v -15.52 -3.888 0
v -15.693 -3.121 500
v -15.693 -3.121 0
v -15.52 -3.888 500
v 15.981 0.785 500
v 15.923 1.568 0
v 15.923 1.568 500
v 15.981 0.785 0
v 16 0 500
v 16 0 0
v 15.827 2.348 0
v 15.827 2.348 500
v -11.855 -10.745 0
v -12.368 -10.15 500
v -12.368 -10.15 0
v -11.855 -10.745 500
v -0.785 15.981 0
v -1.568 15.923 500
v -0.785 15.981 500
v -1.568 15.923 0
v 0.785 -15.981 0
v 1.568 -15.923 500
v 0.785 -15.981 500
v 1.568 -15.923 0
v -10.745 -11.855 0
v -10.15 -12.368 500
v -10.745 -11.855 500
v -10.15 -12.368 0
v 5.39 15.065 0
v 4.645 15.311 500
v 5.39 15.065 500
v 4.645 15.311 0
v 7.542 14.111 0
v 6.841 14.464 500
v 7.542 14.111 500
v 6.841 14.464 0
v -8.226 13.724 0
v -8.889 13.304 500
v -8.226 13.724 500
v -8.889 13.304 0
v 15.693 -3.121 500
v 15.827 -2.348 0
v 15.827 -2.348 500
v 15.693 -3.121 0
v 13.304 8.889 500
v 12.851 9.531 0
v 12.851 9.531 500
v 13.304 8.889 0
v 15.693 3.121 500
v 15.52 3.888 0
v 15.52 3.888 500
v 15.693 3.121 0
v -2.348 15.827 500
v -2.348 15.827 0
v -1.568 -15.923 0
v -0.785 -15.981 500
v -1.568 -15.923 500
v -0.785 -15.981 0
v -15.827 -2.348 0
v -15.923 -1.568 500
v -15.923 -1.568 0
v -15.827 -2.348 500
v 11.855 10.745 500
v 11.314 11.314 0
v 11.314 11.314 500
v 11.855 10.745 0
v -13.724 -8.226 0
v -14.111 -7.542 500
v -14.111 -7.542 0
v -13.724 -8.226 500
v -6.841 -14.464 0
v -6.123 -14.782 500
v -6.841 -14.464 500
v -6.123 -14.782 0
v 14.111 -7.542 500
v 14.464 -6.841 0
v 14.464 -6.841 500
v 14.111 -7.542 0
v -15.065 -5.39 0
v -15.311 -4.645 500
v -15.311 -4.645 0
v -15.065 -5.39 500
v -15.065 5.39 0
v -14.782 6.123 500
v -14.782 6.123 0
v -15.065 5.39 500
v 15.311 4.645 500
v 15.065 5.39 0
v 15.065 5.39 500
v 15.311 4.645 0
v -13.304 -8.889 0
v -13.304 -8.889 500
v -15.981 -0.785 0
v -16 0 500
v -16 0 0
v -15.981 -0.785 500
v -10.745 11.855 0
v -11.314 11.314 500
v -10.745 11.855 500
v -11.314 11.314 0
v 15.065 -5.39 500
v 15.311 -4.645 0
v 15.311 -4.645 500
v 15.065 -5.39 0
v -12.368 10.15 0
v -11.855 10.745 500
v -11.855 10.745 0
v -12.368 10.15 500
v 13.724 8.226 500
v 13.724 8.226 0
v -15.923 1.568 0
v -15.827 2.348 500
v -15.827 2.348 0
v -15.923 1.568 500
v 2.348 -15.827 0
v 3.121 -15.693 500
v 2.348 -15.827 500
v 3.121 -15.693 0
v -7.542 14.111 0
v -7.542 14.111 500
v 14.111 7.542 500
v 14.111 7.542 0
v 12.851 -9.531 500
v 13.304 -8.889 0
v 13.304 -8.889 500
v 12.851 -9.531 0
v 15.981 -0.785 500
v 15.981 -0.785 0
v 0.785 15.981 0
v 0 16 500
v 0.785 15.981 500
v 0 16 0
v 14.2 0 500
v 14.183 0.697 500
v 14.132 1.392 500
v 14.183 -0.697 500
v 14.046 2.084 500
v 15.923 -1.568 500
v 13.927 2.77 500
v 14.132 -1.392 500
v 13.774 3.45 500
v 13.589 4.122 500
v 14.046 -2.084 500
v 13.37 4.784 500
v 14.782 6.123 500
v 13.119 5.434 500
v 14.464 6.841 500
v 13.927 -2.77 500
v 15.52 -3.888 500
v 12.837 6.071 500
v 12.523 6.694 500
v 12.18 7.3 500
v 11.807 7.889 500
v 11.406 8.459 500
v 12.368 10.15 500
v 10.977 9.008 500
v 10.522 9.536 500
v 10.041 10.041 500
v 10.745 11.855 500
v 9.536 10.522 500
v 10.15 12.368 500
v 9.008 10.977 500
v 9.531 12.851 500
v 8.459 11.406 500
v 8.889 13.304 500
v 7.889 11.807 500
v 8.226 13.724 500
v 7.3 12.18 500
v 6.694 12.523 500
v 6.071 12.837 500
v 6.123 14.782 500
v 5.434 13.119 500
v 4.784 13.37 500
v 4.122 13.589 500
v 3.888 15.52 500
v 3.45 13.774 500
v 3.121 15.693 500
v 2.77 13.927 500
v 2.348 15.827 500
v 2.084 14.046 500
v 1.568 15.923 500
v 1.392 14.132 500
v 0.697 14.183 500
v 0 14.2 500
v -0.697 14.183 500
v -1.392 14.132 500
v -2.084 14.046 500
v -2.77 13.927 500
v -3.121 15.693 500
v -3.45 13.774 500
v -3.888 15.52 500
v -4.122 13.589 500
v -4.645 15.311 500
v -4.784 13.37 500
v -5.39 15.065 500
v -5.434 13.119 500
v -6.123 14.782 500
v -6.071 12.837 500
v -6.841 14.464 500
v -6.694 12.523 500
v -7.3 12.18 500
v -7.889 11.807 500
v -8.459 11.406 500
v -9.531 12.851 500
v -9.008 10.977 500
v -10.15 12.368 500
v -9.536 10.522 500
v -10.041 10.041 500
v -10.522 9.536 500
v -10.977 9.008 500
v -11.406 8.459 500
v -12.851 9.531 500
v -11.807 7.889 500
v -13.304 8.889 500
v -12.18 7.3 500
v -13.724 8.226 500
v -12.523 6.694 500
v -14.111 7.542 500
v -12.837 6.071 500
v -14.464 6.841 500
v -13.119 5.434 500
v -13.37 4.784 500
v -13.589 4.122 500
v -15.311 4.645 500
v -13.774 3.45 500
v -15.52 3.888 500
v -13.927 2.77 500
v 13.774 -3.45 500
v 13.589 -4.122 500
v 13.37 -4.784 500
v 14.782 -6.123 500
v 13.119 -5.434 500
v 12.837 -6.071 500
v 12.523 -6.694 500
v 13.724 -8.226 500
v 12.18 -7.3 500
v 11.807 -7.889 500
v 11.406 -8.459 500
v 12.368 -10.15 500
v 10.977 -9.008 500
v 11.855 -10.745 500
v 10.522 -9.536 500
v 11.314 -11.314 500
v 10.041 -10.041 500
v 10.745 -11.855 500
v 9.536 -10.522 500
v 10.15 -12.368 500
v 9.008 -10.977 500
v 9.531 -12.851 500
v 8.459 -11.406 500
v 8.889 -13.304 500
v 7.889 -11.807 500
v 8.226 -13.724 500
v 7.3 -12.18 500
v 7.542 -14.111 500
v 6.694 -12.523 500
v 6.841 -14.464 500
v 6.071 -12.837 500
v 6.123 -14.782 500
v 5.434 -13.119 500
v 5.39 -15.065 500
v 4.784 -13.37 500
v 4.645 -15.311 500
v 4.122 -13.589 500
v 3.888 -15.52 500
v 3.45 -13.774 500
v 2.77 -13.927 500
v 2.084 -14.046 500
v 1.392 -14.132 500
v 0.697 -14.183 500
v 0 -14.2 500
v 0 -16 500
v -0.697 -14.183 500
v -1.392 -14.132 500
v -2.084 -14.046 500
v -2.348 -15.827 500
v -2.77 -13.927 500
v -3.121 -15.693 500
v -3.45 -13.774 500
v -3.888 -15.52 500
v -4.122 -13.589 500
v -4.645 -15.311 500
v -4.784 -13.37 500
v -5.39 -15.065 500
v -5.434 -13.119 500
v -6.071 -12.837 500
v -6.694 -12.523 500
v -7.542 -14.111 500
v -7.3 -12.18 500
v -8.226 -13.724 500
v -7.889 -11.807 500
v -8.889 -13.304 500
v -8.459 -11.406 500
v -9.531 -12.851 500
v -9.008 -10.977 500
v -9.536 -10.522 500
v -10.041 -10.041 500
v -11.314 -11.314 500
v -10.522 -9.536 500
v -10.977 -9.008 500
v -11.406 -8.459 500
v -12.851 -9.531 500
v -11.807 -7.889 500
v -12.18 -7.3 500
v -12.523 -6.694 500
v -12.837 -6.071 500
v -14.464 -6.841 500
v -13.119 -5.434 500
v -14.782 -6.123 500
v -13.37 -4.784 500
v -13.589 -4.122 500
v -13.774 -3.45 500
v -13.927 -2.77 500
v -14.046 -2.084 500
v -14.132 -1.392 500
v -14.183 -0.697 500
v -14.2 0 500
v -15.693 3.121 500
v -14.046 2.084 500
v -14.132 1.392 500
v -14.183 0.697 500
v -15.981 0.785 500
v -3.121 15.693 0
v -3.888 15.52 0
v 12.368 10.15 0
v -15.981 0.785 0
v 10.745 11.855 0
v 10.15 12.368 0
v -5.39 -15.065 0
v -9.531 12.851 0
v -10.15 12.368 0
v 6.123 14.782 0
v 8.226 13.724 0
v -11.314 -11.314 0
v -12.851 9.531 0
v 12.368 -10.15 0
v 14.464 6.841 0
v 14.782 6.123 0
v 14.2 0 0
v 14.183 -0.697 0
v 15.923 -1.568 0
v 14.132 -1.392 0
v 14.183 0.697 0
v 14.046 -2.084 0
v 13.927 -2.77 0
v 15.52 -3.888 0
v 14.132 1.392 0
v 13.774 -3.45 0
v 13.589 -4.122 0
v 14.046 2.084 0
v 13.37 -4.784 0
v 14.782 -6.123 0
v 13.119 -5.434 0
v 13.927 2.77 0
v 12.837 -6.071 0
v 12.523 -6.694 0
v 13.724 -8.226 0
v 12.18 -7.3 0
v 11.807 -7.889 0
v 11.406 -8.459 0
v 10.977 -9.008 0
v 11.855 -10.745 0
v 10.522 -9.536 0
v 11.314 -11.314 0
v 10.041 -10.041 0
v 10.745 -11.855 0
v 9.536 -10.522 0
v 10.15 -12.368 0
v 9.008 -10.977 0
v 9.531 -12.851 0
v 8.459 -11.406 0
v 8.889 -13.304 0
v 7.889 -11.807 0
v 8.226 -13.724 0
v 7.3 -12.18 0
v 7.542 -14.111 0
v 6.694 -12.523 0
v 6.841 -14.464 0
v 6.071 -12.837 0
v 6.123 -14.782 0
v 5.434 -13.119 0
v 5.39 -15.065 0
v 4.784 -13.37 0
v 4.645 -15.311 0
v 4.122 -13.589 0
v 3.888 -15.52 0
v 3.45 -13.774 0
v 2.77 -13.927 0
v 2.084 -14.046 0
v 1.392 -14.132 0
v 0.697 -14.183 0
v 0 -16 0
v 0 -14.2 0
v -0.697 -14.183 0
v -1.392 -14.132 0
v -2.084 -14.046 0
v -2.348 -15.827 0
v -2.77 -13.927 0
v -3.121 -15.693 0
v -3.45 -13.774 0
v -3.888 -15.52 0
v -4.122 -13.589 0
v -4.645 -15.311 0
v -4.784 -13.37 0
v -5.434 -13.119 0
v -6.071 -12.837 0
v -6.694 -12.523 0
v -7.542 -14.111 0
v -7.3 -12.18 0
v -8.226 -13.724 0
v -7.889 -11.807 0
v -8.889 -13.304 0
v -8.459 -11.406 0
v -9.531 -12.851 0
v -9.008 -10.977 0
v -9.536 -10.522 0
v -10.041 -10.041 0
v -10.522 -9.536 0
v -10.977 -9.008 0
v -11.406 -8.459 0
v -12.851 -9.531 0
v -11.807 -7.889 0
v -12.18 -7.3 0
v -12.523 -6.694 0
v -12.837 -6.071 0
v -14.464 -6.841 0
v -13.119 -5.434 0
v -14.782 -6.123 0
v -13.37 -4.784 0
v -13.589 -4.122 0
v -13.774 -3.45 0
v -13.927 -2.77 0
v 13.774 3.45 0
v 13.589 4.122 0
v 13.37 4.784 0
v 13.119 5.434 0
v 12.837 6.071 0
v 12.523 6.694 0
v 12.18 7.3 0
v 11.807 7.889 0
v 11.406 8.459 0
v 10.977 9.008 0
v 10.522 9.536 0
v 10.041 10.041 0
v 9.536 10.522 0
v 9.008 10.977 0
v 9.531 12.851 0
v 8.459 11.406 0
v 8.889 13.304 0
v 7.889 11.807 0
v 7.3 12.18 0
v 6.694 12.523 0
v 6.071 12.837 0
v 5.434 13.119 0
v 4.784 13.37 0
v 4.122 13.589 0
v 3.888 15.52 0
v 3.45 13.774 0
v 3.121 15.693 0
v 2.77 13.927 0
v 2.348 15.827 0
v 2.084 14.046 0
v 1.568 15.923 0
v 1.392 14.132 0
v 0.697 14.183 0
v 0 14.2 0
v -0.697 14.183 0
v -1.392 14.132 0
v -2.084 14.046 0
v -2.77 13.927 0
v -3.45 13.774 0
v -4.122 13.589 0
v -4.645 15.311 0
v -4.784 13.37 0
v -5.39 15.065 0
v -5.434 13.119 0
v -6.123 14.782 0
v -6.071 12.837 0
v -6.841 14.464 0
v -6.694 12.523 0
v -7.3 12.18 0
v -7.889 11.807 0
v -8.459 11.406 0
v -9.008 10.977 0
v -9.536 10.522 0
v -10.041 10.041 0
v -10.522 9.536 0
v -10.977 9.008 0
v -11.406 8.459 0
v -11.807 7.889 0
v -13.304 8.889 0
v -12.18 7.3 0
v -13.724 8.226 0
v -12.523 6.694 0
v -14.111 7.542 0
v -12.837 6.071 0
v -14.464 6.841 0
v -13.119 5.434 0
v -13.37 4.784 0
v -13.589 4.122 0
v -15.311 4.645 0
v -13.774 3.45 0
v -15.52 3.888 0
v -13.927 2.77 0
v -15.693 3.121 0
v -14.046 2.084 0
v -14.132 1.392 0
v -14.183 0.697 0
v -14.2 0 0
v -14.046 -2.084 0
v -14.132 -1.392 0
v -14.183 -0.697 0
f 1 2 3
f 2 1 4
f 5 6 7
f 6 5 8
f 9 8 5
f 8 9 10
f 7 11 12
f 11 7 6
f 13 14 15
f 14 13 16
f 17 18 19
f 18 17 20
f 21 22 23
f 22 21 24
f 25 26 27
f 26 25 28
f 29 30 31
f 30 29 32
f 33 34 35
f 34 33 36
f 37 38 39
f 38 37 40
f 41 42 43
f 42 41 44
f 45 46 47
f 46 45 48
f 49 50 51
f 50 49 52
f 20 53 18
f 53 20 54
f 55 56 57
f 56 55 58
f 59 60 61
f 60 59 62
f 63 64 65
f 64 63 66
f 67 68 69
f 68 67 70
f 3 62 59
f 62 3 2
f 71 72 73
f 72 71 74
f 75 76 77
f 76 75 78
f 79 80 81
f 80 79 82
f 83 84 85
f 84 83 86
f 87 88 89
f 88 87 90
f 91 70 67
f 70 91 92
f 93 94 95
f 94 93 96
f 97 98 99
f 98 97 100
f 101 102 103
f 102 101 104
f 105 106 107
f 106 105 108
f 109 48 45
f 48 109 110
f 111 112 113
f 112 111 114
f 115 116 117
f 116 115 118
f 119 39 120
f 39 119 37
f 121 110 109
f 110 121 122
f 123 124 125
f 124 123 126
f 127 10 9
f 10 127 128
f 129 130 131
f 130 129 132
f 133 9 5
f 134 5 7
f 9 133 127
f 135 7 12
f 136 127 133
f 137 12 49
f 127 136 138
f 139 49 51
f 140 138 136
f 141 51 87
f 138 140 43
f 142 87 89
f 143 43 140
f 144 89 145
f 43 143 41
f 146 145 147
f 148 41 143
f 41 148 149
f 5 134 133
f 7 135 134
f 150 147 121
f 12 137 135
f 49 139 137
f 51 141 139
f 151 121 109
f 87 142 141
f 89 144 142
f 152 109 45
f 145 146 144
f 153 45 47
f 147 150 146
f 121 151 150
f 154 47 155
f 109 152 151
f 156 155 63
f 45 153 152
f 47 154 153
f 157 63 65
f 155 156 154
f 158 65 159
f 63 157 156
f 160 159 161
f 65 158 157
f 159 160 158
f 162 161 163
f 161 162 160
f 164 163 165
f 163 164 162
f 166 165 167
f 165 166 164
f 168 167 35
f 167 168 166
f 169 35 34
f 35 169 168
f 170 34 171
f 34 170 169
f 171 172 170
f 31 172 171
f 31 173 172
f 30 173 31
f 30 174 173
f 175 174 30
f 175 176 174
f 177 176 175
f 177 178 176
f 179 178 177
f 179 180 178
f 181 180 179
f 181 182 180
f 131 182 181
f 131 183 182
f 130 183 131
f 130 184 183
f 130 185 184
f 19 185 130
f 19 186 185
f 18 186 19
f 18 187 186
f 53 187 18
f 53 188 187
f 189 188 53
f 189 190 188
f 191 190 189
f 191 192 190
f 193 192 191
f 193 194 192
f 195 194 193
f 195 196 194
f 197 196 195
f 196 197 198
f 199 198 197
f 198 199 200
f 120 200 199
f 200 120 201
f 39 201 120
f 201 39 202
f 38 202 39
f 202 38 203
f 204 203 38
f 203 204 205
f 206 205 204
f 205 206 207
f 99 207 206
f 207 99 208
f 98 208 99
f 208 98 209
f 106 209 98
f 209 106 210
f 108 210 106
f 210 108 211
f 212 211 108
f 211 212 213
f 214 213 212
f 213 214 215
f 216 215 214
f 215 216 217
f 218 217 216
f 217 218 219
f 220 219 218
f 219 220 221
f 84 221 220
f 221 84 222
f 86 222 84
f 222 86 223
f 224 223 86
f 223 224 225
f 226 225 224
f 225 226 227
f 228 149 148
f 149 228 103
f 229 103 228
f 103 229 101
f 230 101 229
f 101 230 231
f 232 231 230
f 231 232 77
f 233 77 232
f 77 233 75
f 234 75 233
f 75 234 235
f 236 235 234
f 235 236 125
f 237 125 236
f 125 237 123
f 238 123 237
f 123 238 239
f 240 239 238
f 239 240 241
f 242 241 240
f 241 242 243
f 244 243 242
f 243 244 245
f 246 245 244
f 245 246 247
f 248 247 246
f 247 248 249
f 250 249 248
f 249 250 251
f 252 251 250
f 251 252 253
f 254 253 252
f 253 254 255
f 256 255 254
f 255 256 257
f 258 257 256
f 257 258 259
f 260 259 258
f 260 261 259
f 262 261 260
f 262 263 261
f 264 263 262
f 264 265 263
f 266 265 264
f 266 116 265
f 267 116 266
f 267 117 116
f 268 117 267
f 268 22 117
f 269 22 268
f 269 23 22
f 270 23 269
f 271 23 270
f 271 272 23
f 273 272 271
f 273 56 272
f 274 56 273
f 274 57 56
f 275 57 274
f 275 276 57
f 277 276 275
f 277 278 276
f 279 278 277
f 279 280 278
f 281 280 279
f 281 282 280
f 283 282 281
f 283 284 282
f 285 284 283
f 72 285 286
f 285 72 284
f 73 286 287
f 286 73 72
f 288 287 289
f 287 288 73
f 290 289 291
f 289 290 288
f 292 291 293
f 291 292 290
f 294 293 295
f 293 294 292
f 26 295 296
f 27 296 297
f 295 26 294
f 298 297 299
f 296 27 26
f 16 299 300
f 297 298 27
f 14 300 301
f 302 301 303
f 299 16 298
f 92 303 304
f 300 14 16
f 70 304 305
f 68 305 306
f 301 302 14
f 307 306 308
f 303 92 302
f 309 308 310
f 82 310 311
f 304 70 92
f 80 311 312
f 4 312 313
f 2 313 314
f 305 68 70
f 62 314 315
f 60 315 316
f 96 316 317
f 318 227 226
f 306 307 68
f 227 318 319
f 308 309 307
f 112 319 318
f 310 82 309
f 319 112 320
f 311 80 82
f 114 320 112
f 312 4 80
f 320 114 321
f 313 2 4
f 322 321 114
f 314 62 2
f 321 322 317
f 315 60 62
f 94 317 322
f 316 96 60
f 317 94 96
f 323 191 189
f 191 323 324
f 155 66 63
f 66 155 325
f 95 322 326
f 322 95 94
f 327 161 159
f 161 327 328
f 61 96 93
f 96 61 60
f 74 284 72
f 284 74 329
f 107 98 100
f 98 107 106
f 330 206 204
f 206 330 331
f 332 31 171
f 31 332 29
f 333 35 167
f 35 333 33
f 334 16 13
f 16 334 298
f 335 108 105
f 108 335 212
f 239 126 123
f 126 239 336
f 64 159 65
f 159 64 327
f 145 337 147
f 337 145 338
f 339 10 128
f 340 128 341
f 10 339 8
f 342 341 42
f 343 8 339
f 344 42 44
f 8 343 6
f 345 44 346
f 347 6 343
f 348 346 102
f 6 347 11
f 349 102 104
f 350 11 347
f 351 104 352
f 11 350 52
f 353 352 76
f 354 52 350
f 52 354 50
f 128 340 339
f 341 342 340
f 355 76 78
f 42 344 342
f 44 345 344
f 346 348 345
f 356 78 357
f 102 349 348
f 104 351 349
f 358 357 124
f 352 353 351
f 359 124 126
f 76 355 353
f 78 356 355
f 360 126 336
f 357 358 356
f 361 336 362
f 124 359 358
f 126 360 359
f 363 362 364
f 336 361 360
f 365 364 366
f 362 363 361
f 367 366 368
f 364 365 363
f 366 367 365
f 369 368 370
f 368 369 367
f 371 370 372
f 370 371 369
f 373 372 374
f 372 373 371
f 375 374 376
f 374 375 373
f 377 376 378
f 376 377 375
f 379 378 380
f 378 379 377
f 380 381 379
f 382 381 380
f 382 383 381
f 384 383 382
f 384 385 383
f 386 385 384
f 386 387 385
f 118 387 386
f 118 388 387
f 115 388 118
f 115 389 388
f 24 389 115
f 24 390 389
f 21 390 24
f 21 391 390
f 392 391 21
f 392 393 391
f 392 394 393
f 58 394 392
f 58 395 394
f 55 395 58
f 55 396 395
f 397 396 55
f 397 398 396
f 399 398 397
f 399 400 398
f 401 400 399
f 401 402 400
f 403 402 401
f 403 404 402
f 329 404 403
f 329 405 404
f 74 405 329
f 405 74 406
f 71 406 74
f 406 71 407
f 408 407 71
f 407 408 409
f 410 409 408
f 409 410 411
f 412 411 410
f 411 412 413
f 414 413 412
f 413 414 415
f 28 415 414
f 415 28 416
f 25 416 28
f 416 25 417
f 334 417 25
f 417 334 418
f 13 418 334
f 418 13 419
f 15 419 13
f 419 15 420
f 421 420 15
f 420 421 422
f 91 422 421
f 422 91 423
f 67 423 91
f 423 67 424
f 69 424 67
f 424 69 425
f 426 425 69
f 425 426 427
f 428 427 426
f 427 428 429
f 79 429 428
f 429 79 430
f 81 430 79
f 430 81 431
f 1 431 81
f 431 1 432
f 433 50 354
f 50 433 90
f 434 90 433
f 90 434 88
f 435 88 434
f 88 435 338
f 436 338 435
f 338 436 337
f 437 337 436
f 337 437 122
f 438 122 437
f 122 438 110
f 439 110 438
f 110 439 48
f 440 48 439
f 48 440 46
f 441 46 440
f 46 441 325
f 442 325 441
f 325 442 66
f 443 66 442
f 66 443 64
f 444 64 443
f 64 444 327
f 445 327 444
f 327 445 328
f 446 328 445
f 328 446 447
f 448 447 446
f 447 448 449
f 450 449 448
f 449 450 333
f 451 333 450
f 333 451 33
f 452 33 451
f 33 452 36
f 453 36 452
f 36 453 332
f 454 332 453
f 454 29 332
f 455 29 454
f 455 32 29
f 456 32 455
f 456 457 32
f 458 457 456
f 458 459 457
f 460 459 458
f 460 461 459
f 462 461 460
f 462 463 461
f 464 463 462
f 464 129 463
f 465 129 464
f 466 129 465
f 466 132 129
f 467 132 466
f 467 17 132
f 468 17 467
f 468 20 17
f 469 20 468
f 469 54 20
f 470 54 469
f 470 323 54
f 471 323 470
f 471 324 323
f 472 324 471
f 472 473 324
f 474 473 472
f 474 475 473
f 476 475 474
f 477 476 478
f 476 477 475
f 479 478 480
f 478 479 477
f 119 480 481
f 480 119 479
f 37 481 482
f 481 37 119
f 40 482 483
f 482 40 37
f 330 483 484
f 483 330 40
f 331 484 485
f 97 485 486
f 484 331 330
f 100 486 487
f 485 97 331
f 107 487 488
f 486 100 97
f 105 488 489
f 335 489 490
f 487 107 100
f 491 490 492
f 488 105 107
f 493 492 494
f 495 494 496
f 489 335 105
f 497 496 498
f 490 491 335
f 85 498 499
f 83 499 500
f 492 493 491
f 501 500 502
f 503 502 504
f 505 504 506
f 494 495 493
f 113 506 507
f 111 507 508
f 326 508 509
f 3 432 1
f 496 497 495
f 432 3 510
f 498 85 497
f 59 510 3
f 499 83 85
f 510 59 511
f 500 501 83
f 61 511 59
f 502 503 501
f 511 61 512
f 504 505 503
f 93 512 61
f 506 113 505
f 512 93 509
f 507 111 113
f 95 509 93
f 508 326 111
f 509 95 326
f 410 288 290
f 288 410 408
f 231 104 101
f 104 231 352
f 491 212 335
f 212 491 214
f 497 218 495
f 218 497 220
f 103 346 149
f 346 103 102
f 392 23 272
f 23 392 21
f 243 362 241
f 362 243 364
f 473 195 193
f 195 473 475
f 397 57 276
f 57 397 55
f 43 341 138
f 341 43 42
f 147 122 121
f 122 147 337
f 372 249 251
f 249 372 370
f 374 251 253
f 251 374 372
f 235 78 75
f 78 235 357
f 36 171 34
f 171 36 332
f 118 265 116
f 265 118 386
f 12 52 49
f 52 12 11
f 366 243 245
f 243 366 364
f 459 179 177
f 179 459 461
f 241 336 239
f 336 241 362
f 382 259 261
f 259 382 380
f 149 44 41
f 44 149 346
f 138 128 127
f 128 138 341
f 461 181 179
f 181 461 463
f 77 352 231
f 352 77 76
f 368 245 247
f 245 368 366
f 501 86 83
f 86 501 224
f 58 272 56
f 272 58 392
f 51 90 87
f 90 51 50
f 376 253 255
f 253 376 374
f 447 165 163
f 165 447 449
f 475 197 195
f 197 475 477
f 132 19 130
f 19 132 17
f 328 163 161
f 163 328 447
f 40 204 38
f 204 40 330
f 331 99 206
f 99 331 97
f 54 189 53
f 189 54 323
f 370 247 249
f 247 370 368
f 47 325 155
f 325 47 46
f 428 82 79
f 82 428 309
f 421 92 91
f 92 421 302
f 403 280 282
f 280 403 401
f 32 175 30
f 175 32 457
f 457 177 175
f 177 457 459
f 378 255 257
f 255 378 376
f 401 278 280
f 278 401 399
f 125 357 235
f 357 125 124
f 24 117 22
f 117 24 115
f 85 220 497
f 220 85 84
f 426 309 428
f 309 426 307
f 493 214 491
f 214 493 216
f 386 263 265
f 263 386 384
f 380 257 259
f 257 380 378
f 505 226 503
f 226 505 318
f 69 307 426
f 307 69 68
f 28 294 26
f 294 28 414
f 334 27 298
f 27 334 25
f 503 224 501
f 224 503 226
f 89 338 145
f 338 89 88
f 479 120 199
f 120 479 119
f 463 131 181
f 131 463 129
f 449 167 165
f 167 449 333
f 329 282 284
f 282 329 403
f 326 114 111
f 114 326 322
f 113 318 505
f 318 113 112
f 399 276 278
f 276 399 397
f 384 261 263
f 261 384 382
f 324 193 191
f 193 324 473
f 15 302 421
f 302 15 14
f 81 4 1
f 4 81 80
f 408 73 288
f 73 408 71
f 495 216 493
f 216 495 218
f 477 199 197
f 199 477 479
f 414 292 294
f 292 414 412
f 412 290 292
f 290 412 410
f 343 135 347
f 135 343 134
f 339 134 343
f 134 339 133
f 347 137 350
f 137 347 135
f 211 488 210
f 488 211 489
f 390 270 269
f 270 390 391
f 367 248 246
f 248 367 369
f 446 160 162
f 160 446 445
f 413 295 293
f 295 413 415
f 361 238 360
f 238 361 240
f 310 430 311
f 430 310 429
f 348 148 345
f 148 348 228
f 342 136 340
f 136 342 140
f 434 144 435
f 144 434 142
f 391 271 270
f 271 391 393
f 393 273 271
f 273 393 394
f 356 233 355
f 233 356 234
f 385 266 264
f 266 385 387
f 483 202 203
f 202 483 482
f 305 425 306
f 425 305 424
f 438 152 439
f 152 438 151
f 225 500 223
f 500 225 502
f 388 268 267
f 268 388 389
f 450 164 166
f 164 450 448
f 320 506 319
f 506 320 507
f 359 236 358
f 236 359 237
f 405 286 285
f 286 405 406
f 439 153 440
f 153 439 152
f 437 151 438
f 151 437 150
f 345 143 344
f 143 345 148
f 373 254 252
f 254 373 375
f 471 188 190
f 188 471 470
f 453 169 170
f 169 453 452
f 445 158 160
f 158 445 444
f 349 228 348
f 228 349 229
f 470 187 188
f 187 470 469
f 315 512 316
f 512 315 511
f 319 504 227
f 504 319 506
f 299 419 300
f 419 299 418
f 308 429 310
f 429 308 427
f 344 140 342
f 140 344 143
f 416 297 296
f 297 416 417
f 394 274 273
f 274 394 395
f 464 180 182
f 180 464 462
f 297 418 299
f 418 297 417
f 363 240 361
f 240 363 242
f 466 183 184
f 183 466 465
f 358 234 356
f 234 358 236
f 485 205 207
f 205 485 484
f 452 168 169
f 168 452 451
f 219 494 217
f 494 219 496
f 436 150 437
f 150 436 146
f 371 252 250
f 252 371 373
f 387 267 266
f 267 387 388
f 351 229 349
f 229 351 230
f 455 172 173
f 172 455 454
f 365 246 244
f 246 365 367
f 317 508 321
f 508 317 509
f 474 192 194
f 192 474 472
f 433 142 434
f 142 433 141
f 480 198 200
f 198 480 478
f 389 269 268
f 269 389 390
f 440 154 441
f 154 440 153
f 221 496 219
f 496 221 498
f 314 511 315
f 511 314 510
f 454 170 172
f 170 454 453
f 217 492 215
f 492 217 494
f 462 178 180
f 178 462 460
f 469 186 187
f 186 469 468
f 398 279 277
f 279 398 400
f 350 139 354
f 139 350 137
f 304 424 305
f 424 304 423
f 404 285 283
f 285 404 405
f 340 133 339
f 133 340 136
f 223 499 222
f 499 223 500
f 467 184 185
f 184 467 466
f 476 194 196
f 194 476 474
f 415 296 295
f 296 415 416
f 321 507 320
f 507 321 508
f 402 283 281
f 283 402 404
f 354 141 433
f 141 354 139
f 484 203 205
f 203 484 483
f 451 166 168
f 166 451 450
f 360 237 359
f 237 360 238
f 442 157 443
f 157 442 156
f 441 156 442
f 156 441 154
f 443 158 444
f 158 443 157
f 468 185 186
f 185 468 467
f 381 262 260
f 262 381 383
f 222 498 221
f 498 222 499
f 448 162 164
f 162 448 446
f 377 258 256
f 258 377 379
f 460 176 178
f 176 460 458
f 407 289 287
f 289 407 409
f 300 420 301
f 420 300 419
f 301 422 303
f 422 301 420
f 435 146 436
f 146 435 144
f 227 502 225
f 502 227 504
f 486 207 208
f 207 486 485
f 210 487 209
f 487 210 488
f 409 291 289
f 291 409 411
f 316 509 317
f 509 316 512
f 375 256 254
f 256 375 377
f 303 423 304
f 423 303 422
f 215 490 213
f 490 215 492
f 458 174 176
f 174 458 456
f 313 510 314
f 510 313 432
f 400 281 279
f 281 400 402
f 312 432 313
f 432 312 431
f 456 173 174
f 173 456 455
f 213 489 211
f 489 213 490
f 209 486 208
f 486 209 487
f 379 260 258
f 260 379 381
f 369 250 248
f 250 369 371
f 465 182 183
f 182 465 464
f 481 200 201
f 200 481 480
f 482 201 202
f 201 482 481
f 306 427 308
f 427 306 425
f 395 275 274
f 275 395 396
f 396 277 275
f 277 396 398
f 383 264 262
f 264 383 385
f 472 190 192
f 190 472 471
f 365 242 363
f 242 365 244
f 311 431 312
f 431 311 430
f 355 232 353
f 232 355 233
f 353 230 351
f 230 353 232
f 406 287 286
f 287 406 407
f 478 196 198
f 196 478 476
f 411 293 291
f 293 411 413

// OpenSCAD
$fn = 128;

// HT pipe parameters (approximate for HT 32)
pipe_length = 500;          // mm
outer_diameter = 32;        // mm
wall_thickness = 1.8;       // mm (typical-ish for HT 32)
inner_diameter = outer_diameter - 2*wall_thickness;

module ht_pipe(od, id, L) {
    difference() {
        cylinder(h = L, d = od);
        translate([0,0,-0.5])
            cylinder(h = L + 1, d = id);
    }
}

ht_pipe(outer_diameter, inner_diameter, pipe_length);
